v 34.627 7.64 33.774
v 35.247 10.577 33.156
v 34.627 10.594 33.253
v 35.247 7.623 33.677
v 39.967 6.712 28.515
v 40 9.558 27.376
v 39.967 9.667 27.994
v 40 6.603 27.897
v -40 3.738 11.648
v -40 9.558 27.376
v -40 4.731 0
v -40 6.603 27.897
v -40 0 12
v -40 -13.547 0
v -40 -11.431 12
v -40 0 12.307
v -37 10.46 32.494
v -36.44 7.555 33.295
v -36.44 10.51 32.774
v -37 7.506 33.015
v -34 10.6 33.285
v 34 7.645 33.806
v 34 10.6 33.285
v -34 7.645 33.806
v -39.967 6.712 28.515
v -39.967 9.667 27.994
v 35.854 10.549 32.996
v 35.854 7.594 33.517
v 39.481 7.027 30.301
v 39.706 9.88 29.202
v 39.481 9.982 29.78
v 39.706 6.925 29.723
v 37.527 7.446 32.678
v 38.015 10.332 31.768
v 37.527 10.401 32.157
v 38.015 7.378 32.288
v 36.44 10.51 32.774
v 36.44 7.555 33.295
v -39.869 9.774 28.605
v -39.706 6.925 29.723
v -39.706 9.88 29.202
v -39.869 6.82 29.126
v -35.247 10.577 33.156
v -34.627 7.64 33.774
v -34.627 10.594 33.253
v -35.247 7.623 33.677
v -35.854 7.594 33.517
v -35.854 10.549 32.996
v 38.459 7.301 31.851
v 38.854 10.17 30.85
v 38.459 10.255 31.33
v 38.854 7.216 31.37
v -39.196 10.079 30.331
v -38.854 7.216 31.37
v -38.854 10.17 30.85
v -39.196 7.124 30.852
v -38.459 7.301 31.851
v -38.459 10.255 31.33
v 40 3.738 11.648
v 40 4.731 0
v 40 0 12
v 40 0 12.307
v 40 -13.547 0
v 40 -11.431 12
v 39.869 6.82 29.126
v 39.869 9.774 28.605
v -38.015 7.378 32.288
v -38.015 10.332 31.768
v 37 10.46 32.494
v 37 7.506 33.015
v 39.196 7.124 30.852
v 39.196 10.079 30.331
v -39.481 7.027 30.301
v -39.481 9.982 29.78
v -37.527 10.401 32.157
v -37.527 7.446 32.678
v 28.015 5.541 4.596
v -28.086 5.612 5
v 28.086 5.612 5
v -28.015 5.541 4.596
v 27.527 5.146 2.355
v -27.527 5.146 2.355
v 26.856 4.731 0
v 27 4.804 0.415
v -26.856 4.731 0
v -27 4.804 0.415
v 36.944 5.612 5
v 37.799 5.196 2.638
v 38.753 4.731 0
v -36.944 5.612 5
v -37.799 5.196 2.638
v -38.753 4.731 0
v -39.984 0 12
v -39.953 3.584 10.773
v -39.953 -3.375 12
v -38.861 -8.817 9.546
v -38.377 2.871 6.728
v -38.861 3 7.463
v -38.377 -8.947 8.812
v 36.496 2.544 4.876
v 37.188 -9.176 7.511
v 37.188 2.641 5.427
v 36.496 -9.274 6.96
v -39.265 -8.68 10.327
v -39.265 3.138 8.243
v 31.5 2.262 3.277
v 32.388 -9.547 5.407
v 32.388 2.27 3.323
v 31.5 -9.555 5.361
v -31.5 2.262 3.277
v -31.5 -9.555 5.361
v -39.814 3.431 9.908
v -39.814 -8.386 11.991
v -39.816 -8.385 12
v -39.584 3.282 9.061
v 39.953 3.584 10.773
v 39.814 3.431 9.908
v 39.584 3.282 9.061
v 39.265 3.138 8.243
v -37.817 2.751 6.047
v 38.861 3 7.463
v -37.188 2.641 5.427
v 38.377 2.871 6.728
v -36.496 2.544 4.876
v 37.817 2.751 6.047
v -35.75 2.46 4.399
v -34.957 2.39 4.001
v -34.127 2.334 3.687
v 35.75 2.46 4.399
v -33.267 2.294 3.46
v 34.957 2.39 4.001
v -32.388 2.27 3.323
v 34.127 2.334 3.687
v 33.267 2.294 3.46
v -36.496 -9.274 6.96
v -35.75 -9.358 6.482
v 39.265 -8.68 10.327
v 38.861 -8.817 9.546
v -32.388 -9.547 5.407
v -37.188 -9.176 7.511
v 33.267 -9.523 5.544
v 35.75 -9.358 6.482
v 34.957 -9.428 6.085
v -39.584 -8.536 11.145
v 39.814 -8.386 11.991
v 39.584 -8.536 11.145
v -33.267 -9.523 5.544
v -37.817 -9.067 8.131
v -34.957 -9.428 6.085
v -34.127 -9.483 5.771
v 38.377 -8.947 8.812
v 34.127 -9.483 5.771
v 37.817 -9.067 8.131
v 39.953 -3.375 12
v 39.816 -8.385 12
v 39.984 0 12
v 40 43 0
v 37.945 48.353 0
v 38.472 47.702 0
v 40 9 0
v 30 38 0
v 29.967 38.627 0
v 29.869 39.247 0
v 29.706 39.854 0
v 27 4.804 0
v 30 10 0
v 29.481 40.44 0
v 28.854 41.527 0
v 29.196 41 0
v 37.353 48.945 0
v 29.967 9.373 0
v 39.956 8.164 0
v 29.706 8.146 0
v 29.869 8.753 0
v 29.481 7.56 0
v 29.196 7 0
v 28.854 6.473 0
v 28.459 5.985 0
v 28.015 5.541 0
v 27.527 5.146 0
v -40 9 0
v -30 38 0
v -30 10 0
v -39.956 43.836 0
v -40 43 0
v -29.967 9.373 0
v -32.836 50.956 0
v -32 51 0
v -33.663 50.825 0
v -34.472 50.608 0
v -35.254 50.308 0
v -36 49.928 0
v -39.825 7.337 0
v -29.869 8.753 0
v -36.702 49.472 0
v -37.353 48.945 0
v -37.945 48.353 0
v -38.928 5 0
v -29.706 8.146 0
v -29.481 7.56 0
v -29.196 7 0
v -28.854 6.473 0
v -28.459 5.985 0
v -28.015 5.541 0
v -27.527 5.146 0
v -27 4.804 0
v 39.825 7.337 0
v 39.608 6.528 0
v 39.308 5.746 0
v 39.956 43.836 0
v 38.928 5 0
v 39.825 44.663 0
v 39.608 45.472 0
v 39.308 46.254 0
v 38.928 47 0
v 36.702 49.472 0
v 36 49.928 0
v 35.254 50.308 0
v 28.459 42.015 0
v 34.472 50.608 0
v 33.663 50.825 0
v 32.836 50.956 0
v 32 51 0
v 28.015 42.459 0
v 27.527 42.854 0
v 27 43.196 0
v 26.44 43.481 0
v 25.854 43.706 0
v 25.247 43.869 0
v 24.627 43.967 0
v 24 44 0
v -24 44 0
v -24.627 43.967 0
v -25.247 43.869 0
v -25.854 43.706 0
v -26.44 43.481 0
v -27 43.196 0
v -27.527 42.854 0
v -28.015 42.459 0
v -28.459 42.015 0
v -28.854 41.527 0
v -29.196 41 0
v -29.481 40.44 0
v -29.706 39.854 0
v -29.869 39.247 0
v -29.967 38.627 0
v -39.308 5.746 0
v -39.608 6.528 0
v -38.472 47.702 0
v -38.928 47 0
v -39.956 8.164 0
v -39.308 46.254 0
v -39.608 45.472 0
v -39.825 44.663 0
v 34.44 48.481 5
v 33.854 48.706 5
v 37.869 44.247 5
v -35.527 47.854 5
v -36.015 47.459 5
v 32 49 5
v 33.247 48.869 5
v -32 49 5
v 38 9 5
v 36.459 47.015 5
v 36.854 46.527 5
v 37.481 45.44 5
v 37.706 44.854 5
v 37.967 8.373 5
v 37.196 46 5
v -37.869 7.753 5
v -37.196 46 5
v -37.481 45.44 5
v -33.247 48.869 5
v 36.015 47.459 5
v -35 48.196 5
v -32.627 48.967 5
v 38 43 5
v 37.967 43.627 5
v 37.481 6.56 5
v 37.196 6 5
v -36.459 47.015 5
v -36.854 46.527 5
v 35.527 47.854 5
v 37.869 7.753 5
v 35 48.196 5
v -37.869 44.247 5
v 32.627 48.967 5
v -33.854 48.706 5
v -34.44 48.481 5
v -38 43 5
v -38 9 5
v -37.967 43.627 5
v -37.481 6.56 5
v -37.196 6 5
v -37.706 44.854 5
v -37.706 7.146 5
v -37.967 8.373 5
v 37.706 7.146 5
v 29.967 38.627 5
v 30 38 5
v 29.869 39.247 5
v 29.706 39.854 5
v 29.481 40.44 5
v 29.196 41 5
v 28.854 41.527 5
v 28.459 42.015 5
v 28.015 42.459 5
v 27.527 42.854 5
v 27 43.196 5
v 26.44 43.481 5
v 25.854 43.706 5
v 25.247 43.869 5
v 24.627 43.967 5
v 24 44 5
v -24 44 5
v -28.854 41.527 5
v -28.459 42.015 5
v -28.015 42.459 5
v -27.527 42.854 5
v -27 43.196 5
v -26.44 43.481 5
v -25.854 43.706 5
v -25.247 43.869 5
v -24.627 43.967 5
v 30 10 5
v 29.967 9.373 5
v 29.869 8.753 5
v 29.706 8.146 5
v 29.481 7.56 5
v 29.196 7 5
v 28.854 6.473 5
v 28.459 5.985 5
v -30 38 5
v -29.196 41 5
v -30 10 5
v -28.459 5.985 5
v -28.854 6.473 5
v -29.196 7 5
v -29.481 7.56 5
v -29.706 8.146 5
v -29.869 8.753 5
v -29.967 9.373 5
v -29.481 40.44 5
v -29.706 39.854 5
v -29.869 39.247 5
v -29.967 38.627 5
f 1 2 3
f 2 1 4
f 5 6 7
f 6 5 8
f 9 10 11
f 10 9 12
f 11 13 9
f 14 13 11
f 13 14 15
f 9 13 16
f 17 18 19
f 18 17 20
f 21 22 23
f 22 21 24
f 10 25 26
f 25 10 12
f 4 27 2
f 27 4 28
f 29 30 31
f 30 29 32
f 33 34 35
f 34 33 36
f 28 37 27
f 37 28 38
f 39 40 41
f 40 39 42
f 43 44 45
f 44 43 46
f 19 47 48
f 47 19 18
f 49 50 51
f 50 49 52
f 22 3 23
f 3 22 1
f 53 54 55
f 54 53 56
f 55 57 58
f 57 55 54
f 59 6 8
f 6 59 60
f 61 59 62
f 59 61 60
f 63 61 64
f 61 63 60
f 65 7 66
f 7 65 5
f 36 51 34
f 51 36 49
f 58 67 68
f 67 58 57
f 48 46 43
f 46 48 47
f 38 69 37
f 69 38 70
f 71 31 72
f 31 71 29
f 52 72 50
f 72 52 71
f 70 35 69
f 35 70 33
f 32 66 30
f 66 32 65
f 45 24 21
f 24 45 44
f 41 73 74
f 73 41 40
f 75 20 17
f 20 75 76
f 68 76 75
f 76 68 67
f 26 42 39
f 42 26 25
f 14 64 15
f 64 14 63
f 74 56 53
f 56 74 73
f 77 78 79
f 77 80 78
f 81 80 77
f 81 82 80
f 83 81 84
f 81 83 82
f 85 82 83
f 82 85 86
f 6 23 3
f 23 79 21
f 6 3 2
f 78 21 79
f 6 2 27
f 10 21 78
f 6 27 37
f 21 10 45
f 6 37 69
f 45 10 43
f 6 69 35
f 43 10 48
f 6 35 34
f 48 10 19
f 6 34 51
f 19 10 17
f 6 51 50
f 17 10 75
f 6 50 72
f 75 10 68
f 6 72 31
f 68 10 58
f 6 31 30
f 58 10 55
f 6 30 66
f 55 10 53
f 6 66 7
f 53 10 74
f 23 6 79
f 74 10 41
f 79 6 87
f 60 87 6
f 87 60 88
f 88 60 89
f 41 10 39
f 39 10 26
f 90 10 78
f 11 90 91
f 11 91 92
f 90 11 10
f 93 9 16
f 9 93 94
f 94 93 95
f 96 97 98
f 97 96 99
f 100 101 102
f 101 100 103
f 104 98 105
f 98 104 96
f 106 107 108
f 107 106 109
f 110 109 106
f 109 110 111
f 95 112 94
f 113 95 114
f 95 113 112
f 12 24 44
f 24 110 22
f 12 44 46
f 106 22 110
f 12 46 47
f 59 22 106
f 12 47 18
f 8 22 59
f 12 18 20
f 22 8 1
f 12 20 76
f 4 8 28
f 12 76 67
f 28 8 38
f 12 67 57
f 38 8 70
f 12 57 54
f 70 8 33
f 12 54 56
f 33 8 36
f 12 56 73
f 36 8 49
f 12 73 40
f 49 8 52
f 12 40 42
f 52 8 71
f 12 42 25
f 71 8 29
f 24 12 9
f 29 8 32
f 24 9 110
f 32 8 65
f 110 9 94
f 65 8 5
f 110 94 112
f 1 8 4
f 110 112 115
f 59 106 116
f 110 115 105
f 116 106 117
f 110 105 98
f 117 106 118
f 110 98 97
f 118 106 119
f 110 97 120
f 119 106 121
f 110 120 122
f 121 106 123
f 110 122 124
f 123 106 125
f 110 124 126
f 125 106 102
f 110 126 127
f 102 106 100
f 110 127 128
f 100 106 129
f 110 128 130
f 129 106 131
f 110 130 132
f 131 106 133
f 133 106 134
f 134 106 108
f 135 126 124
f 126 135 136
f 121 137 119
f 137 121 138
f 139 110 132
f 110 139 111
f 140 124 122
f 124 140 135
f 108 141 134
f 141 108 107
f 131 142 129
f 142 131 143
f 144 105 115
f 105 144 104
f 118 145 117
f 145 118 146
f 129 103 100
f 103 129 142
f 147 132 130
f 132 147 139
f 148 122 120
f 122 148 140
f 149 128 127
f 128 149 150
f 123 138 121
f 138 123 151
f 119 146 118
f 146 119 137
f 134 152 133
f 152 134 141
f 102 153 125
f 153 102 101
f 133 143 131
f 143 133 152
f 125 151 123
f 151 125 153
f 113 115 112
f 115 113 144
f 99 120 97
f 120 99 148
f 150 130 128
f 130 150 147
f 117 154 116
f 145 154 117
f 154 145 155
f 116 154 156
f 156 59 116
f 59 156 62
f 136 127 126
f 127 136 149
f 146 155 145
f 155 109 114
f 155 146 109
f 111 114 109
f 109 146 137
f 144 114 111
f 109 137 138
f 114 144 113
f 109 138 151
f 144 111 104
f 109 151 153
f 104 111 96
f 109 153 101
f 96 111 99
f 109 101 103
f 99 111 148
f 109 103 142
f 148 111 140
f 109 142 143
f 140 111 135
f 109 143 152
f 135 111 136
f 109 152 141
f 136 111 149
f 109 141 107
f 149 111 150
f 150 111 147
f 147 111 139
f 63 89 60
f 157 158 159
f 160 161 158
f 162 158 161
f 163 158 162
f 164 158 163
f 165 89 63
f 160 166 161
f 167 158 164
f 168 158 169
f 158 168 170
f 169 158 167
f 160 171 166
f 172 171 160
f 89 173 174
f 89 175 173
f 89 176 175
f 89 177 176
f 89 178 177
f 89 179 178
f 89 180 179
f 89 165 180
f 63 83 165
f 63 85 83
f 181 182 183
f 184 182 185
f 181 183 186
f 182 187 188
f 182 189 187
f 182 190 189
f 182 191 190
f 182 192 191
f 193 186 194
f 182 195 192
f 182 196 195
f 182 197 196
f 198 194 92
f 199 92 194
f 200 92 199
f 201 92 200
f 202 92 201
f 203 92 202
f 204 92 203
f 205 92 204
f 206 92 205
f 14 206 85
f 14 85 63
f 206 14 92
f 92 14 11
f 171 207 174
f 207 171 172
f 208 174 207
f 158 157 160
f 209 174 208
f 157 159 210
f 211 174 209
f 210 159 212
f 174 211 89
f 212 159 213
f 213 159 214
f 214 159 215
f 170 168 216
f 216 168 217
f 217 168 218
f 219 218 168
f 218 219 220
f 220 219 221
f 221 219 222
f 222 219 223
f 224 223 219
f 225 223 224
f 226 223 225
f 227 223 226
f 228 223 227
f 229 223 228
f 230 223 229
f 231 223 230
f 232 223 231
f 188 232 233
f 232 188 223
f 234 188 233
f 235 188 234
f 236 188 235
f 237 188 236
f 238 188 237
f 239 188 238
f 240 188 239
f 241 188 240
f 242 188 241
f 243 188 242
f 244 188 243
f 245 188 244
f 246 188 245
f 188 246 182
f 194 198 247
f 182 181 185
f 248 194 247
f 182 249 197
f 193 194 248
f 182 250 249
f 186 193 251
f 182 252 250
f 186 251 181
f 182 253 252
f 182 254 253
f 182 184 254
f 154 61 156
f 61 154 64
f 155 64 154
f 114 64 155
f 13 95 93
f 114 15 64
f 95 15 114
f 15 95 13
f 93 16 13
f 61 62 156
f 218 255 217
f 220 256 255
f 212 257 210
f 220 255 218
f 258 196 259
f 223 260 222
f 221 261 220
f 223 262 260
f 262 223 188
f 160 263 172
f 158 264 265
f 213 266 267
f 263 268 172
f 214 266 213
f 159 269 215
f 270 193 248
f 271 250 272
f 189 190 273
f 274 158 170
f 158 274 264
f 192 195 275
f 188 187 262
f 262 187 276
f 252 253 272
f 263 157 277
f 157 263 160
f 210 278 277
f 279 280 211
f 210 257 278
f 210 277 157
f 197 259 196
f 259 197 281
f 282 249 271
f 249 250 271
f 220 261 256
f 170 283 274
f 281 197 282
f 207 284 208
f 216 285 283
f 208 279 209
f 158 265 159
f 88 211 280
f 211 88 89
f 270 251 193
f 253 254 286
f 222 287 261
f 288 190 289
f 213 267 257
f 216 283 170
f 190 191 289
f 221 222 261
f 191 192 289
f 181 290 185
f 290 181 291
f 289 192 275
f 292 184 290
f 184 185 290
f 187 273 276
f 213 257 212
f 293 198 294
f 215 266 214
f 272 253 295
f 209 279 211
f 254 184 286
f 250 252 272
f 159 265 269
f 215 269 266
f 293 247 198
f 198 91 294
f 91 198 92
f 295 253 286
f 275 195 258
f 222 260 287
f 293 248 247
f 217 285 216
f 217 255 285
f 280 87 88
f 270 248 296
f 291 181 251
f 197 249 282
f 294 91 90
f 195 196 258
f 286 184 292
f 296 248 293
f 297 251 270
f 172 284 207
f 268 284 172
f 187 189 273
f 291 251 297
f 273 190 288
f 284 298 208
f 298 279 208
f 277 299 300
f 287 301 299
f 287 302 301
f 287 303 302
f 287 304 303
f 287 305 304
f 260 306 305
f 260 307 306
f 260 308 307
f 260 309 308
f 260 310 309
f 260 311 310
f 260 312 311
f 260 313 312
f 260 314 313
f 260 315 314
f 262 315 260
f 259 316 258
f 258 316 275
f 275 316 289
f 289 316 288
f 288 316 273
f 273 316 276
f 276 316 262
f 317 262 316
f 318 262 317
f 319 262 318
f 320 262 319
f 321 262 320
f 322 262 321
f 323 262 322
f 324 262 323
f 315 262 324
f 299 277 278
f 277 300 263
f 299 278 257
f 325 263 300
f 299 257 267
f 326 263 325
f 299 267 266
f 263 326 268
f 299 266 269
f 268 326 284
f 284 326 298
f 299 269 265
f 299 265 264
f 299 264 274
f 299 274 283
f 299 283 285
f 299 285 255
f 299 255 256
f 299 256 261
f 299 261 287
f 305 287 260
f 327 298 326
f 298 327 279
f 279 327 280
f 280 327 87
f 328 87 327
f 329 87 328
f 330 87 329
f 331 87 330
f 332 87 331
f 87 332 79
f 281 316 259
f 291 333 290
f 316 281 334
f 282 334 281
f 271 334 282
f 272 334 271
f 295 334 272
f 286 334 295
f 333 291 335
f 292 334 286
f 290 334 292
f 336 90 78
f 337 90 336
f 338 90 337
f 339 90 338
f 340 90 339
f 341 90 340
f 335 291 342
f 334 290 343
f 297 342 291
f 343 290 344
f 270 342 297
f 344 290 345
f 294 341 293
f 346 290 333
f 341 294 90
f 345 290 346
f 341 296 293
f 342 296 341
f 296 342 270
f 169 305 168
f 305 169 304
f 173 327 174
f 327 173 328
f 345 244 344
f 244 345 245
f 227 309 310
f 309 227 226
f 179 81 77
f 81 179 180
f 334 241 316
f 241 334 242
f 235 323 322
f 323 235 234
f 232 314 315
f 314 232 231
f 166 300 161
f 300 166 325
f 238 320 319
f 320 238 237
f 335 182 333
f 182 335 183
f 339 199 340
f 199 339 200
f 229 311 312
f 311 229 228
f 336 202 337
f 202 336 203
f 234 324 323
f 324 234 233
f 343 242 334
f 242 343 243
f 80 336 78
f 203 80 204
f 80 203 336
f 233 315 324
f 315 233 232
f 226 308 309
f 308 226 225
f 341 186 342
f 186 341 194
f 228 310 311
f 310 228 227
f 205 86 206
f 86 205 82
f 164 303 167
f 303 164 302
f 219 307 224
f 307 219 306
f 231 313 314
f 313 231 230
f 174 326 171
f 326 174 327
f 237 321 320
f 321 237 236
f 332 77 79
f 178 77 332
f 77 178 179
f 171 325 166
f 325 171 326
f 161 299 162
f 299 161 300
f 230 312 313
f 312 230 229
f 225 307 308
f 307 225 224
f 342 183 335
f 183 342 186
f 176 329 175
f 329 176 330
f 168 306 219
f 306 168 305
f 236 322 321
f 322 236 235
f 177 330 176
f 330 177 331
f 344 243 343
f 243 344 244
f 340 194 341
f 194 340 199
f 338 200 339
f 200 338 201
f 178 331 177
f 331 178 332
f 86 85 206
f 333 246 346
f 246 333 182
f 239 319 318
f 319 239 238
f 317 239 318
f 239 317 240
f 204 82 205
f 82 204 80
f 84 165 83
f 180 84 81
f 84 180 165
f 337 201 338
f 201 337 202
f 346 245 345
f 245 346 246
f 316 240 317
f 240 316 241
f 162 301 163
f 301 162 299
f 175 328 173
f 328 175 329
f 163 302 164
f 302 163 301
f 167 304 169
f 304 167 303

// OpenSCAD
module roundcube(x, y, z, r) {
  hull() {
    translate([-(x/2-r), -(y/2-r), -z/2])
      cylinder(r1=r, r2=r, h=z, $fn=60);
    translate([-(x/2-r), +(y/2-r), -z/2])
      cylinder(r1=r, r2=r, h=z, $fn=60);
    translate([+(x/2-r), -(y/2-r), -z/2])
      cylinder(r1=r, r2=r, h=z, $fn=60);
    translate([+(x/2-r), +(y/2-r), -z/2])
      cylinder(r1=r, r2=r, h=z, $fn=60);
  }
}

module roundcube2(x, y, z, R1, R2) {
  hull() {
    translate([-(x/2-R2), -(y/2-R2), -z/2])
      cylinder(r1=R2, r2=R1, h=z, $fn=60);
    translate([-(x/2-R2), +(y/2-R2), -z/2])
      cylinder(r1=R2, r2=R1, h=z, $fn=60);
    translate([+(x/2-R2), -(y/2-R2), -z/2])
      cylinder(r1=R2, r2=R1, h=z, $fn=60);
    translate([+(x/2-R2), +(y/2-R2), -z/2])
      cylinder(r1=R2, r2=R1, h=z, $fn=60);
  }
}


module stand() {
    union() {
        difference() {
            intersection() {
              translate([0, 0, 25])
                rotate([80, 0, 0])
                    difference() {
                     translate([0, -20, 0])   
                       roundcube(80, 60, 18, 6);
                     translate([0, 9, 0])   
//                       cube([80, 60, 12], center=true);  
                         roundcube(80, 60, 12, 8.5);  
                    }
              translate([0, 0, 50])
                cube([100, 100, 100], center=true);
            }
            translate([0, -50, 62])
              cube([100, 100, 100], center=true);
        }    
        translate([0, 26, 2.5]) 
          difference() {
            roundcube2(80, 50, 5, 6, 8);          
            translate([-0, -2, 0])   
              roundcube(60, 40, 5, 6);
          }
    }
}



//translate([0, 0, 15]) rotate([0, 90, 0])
  stand();
